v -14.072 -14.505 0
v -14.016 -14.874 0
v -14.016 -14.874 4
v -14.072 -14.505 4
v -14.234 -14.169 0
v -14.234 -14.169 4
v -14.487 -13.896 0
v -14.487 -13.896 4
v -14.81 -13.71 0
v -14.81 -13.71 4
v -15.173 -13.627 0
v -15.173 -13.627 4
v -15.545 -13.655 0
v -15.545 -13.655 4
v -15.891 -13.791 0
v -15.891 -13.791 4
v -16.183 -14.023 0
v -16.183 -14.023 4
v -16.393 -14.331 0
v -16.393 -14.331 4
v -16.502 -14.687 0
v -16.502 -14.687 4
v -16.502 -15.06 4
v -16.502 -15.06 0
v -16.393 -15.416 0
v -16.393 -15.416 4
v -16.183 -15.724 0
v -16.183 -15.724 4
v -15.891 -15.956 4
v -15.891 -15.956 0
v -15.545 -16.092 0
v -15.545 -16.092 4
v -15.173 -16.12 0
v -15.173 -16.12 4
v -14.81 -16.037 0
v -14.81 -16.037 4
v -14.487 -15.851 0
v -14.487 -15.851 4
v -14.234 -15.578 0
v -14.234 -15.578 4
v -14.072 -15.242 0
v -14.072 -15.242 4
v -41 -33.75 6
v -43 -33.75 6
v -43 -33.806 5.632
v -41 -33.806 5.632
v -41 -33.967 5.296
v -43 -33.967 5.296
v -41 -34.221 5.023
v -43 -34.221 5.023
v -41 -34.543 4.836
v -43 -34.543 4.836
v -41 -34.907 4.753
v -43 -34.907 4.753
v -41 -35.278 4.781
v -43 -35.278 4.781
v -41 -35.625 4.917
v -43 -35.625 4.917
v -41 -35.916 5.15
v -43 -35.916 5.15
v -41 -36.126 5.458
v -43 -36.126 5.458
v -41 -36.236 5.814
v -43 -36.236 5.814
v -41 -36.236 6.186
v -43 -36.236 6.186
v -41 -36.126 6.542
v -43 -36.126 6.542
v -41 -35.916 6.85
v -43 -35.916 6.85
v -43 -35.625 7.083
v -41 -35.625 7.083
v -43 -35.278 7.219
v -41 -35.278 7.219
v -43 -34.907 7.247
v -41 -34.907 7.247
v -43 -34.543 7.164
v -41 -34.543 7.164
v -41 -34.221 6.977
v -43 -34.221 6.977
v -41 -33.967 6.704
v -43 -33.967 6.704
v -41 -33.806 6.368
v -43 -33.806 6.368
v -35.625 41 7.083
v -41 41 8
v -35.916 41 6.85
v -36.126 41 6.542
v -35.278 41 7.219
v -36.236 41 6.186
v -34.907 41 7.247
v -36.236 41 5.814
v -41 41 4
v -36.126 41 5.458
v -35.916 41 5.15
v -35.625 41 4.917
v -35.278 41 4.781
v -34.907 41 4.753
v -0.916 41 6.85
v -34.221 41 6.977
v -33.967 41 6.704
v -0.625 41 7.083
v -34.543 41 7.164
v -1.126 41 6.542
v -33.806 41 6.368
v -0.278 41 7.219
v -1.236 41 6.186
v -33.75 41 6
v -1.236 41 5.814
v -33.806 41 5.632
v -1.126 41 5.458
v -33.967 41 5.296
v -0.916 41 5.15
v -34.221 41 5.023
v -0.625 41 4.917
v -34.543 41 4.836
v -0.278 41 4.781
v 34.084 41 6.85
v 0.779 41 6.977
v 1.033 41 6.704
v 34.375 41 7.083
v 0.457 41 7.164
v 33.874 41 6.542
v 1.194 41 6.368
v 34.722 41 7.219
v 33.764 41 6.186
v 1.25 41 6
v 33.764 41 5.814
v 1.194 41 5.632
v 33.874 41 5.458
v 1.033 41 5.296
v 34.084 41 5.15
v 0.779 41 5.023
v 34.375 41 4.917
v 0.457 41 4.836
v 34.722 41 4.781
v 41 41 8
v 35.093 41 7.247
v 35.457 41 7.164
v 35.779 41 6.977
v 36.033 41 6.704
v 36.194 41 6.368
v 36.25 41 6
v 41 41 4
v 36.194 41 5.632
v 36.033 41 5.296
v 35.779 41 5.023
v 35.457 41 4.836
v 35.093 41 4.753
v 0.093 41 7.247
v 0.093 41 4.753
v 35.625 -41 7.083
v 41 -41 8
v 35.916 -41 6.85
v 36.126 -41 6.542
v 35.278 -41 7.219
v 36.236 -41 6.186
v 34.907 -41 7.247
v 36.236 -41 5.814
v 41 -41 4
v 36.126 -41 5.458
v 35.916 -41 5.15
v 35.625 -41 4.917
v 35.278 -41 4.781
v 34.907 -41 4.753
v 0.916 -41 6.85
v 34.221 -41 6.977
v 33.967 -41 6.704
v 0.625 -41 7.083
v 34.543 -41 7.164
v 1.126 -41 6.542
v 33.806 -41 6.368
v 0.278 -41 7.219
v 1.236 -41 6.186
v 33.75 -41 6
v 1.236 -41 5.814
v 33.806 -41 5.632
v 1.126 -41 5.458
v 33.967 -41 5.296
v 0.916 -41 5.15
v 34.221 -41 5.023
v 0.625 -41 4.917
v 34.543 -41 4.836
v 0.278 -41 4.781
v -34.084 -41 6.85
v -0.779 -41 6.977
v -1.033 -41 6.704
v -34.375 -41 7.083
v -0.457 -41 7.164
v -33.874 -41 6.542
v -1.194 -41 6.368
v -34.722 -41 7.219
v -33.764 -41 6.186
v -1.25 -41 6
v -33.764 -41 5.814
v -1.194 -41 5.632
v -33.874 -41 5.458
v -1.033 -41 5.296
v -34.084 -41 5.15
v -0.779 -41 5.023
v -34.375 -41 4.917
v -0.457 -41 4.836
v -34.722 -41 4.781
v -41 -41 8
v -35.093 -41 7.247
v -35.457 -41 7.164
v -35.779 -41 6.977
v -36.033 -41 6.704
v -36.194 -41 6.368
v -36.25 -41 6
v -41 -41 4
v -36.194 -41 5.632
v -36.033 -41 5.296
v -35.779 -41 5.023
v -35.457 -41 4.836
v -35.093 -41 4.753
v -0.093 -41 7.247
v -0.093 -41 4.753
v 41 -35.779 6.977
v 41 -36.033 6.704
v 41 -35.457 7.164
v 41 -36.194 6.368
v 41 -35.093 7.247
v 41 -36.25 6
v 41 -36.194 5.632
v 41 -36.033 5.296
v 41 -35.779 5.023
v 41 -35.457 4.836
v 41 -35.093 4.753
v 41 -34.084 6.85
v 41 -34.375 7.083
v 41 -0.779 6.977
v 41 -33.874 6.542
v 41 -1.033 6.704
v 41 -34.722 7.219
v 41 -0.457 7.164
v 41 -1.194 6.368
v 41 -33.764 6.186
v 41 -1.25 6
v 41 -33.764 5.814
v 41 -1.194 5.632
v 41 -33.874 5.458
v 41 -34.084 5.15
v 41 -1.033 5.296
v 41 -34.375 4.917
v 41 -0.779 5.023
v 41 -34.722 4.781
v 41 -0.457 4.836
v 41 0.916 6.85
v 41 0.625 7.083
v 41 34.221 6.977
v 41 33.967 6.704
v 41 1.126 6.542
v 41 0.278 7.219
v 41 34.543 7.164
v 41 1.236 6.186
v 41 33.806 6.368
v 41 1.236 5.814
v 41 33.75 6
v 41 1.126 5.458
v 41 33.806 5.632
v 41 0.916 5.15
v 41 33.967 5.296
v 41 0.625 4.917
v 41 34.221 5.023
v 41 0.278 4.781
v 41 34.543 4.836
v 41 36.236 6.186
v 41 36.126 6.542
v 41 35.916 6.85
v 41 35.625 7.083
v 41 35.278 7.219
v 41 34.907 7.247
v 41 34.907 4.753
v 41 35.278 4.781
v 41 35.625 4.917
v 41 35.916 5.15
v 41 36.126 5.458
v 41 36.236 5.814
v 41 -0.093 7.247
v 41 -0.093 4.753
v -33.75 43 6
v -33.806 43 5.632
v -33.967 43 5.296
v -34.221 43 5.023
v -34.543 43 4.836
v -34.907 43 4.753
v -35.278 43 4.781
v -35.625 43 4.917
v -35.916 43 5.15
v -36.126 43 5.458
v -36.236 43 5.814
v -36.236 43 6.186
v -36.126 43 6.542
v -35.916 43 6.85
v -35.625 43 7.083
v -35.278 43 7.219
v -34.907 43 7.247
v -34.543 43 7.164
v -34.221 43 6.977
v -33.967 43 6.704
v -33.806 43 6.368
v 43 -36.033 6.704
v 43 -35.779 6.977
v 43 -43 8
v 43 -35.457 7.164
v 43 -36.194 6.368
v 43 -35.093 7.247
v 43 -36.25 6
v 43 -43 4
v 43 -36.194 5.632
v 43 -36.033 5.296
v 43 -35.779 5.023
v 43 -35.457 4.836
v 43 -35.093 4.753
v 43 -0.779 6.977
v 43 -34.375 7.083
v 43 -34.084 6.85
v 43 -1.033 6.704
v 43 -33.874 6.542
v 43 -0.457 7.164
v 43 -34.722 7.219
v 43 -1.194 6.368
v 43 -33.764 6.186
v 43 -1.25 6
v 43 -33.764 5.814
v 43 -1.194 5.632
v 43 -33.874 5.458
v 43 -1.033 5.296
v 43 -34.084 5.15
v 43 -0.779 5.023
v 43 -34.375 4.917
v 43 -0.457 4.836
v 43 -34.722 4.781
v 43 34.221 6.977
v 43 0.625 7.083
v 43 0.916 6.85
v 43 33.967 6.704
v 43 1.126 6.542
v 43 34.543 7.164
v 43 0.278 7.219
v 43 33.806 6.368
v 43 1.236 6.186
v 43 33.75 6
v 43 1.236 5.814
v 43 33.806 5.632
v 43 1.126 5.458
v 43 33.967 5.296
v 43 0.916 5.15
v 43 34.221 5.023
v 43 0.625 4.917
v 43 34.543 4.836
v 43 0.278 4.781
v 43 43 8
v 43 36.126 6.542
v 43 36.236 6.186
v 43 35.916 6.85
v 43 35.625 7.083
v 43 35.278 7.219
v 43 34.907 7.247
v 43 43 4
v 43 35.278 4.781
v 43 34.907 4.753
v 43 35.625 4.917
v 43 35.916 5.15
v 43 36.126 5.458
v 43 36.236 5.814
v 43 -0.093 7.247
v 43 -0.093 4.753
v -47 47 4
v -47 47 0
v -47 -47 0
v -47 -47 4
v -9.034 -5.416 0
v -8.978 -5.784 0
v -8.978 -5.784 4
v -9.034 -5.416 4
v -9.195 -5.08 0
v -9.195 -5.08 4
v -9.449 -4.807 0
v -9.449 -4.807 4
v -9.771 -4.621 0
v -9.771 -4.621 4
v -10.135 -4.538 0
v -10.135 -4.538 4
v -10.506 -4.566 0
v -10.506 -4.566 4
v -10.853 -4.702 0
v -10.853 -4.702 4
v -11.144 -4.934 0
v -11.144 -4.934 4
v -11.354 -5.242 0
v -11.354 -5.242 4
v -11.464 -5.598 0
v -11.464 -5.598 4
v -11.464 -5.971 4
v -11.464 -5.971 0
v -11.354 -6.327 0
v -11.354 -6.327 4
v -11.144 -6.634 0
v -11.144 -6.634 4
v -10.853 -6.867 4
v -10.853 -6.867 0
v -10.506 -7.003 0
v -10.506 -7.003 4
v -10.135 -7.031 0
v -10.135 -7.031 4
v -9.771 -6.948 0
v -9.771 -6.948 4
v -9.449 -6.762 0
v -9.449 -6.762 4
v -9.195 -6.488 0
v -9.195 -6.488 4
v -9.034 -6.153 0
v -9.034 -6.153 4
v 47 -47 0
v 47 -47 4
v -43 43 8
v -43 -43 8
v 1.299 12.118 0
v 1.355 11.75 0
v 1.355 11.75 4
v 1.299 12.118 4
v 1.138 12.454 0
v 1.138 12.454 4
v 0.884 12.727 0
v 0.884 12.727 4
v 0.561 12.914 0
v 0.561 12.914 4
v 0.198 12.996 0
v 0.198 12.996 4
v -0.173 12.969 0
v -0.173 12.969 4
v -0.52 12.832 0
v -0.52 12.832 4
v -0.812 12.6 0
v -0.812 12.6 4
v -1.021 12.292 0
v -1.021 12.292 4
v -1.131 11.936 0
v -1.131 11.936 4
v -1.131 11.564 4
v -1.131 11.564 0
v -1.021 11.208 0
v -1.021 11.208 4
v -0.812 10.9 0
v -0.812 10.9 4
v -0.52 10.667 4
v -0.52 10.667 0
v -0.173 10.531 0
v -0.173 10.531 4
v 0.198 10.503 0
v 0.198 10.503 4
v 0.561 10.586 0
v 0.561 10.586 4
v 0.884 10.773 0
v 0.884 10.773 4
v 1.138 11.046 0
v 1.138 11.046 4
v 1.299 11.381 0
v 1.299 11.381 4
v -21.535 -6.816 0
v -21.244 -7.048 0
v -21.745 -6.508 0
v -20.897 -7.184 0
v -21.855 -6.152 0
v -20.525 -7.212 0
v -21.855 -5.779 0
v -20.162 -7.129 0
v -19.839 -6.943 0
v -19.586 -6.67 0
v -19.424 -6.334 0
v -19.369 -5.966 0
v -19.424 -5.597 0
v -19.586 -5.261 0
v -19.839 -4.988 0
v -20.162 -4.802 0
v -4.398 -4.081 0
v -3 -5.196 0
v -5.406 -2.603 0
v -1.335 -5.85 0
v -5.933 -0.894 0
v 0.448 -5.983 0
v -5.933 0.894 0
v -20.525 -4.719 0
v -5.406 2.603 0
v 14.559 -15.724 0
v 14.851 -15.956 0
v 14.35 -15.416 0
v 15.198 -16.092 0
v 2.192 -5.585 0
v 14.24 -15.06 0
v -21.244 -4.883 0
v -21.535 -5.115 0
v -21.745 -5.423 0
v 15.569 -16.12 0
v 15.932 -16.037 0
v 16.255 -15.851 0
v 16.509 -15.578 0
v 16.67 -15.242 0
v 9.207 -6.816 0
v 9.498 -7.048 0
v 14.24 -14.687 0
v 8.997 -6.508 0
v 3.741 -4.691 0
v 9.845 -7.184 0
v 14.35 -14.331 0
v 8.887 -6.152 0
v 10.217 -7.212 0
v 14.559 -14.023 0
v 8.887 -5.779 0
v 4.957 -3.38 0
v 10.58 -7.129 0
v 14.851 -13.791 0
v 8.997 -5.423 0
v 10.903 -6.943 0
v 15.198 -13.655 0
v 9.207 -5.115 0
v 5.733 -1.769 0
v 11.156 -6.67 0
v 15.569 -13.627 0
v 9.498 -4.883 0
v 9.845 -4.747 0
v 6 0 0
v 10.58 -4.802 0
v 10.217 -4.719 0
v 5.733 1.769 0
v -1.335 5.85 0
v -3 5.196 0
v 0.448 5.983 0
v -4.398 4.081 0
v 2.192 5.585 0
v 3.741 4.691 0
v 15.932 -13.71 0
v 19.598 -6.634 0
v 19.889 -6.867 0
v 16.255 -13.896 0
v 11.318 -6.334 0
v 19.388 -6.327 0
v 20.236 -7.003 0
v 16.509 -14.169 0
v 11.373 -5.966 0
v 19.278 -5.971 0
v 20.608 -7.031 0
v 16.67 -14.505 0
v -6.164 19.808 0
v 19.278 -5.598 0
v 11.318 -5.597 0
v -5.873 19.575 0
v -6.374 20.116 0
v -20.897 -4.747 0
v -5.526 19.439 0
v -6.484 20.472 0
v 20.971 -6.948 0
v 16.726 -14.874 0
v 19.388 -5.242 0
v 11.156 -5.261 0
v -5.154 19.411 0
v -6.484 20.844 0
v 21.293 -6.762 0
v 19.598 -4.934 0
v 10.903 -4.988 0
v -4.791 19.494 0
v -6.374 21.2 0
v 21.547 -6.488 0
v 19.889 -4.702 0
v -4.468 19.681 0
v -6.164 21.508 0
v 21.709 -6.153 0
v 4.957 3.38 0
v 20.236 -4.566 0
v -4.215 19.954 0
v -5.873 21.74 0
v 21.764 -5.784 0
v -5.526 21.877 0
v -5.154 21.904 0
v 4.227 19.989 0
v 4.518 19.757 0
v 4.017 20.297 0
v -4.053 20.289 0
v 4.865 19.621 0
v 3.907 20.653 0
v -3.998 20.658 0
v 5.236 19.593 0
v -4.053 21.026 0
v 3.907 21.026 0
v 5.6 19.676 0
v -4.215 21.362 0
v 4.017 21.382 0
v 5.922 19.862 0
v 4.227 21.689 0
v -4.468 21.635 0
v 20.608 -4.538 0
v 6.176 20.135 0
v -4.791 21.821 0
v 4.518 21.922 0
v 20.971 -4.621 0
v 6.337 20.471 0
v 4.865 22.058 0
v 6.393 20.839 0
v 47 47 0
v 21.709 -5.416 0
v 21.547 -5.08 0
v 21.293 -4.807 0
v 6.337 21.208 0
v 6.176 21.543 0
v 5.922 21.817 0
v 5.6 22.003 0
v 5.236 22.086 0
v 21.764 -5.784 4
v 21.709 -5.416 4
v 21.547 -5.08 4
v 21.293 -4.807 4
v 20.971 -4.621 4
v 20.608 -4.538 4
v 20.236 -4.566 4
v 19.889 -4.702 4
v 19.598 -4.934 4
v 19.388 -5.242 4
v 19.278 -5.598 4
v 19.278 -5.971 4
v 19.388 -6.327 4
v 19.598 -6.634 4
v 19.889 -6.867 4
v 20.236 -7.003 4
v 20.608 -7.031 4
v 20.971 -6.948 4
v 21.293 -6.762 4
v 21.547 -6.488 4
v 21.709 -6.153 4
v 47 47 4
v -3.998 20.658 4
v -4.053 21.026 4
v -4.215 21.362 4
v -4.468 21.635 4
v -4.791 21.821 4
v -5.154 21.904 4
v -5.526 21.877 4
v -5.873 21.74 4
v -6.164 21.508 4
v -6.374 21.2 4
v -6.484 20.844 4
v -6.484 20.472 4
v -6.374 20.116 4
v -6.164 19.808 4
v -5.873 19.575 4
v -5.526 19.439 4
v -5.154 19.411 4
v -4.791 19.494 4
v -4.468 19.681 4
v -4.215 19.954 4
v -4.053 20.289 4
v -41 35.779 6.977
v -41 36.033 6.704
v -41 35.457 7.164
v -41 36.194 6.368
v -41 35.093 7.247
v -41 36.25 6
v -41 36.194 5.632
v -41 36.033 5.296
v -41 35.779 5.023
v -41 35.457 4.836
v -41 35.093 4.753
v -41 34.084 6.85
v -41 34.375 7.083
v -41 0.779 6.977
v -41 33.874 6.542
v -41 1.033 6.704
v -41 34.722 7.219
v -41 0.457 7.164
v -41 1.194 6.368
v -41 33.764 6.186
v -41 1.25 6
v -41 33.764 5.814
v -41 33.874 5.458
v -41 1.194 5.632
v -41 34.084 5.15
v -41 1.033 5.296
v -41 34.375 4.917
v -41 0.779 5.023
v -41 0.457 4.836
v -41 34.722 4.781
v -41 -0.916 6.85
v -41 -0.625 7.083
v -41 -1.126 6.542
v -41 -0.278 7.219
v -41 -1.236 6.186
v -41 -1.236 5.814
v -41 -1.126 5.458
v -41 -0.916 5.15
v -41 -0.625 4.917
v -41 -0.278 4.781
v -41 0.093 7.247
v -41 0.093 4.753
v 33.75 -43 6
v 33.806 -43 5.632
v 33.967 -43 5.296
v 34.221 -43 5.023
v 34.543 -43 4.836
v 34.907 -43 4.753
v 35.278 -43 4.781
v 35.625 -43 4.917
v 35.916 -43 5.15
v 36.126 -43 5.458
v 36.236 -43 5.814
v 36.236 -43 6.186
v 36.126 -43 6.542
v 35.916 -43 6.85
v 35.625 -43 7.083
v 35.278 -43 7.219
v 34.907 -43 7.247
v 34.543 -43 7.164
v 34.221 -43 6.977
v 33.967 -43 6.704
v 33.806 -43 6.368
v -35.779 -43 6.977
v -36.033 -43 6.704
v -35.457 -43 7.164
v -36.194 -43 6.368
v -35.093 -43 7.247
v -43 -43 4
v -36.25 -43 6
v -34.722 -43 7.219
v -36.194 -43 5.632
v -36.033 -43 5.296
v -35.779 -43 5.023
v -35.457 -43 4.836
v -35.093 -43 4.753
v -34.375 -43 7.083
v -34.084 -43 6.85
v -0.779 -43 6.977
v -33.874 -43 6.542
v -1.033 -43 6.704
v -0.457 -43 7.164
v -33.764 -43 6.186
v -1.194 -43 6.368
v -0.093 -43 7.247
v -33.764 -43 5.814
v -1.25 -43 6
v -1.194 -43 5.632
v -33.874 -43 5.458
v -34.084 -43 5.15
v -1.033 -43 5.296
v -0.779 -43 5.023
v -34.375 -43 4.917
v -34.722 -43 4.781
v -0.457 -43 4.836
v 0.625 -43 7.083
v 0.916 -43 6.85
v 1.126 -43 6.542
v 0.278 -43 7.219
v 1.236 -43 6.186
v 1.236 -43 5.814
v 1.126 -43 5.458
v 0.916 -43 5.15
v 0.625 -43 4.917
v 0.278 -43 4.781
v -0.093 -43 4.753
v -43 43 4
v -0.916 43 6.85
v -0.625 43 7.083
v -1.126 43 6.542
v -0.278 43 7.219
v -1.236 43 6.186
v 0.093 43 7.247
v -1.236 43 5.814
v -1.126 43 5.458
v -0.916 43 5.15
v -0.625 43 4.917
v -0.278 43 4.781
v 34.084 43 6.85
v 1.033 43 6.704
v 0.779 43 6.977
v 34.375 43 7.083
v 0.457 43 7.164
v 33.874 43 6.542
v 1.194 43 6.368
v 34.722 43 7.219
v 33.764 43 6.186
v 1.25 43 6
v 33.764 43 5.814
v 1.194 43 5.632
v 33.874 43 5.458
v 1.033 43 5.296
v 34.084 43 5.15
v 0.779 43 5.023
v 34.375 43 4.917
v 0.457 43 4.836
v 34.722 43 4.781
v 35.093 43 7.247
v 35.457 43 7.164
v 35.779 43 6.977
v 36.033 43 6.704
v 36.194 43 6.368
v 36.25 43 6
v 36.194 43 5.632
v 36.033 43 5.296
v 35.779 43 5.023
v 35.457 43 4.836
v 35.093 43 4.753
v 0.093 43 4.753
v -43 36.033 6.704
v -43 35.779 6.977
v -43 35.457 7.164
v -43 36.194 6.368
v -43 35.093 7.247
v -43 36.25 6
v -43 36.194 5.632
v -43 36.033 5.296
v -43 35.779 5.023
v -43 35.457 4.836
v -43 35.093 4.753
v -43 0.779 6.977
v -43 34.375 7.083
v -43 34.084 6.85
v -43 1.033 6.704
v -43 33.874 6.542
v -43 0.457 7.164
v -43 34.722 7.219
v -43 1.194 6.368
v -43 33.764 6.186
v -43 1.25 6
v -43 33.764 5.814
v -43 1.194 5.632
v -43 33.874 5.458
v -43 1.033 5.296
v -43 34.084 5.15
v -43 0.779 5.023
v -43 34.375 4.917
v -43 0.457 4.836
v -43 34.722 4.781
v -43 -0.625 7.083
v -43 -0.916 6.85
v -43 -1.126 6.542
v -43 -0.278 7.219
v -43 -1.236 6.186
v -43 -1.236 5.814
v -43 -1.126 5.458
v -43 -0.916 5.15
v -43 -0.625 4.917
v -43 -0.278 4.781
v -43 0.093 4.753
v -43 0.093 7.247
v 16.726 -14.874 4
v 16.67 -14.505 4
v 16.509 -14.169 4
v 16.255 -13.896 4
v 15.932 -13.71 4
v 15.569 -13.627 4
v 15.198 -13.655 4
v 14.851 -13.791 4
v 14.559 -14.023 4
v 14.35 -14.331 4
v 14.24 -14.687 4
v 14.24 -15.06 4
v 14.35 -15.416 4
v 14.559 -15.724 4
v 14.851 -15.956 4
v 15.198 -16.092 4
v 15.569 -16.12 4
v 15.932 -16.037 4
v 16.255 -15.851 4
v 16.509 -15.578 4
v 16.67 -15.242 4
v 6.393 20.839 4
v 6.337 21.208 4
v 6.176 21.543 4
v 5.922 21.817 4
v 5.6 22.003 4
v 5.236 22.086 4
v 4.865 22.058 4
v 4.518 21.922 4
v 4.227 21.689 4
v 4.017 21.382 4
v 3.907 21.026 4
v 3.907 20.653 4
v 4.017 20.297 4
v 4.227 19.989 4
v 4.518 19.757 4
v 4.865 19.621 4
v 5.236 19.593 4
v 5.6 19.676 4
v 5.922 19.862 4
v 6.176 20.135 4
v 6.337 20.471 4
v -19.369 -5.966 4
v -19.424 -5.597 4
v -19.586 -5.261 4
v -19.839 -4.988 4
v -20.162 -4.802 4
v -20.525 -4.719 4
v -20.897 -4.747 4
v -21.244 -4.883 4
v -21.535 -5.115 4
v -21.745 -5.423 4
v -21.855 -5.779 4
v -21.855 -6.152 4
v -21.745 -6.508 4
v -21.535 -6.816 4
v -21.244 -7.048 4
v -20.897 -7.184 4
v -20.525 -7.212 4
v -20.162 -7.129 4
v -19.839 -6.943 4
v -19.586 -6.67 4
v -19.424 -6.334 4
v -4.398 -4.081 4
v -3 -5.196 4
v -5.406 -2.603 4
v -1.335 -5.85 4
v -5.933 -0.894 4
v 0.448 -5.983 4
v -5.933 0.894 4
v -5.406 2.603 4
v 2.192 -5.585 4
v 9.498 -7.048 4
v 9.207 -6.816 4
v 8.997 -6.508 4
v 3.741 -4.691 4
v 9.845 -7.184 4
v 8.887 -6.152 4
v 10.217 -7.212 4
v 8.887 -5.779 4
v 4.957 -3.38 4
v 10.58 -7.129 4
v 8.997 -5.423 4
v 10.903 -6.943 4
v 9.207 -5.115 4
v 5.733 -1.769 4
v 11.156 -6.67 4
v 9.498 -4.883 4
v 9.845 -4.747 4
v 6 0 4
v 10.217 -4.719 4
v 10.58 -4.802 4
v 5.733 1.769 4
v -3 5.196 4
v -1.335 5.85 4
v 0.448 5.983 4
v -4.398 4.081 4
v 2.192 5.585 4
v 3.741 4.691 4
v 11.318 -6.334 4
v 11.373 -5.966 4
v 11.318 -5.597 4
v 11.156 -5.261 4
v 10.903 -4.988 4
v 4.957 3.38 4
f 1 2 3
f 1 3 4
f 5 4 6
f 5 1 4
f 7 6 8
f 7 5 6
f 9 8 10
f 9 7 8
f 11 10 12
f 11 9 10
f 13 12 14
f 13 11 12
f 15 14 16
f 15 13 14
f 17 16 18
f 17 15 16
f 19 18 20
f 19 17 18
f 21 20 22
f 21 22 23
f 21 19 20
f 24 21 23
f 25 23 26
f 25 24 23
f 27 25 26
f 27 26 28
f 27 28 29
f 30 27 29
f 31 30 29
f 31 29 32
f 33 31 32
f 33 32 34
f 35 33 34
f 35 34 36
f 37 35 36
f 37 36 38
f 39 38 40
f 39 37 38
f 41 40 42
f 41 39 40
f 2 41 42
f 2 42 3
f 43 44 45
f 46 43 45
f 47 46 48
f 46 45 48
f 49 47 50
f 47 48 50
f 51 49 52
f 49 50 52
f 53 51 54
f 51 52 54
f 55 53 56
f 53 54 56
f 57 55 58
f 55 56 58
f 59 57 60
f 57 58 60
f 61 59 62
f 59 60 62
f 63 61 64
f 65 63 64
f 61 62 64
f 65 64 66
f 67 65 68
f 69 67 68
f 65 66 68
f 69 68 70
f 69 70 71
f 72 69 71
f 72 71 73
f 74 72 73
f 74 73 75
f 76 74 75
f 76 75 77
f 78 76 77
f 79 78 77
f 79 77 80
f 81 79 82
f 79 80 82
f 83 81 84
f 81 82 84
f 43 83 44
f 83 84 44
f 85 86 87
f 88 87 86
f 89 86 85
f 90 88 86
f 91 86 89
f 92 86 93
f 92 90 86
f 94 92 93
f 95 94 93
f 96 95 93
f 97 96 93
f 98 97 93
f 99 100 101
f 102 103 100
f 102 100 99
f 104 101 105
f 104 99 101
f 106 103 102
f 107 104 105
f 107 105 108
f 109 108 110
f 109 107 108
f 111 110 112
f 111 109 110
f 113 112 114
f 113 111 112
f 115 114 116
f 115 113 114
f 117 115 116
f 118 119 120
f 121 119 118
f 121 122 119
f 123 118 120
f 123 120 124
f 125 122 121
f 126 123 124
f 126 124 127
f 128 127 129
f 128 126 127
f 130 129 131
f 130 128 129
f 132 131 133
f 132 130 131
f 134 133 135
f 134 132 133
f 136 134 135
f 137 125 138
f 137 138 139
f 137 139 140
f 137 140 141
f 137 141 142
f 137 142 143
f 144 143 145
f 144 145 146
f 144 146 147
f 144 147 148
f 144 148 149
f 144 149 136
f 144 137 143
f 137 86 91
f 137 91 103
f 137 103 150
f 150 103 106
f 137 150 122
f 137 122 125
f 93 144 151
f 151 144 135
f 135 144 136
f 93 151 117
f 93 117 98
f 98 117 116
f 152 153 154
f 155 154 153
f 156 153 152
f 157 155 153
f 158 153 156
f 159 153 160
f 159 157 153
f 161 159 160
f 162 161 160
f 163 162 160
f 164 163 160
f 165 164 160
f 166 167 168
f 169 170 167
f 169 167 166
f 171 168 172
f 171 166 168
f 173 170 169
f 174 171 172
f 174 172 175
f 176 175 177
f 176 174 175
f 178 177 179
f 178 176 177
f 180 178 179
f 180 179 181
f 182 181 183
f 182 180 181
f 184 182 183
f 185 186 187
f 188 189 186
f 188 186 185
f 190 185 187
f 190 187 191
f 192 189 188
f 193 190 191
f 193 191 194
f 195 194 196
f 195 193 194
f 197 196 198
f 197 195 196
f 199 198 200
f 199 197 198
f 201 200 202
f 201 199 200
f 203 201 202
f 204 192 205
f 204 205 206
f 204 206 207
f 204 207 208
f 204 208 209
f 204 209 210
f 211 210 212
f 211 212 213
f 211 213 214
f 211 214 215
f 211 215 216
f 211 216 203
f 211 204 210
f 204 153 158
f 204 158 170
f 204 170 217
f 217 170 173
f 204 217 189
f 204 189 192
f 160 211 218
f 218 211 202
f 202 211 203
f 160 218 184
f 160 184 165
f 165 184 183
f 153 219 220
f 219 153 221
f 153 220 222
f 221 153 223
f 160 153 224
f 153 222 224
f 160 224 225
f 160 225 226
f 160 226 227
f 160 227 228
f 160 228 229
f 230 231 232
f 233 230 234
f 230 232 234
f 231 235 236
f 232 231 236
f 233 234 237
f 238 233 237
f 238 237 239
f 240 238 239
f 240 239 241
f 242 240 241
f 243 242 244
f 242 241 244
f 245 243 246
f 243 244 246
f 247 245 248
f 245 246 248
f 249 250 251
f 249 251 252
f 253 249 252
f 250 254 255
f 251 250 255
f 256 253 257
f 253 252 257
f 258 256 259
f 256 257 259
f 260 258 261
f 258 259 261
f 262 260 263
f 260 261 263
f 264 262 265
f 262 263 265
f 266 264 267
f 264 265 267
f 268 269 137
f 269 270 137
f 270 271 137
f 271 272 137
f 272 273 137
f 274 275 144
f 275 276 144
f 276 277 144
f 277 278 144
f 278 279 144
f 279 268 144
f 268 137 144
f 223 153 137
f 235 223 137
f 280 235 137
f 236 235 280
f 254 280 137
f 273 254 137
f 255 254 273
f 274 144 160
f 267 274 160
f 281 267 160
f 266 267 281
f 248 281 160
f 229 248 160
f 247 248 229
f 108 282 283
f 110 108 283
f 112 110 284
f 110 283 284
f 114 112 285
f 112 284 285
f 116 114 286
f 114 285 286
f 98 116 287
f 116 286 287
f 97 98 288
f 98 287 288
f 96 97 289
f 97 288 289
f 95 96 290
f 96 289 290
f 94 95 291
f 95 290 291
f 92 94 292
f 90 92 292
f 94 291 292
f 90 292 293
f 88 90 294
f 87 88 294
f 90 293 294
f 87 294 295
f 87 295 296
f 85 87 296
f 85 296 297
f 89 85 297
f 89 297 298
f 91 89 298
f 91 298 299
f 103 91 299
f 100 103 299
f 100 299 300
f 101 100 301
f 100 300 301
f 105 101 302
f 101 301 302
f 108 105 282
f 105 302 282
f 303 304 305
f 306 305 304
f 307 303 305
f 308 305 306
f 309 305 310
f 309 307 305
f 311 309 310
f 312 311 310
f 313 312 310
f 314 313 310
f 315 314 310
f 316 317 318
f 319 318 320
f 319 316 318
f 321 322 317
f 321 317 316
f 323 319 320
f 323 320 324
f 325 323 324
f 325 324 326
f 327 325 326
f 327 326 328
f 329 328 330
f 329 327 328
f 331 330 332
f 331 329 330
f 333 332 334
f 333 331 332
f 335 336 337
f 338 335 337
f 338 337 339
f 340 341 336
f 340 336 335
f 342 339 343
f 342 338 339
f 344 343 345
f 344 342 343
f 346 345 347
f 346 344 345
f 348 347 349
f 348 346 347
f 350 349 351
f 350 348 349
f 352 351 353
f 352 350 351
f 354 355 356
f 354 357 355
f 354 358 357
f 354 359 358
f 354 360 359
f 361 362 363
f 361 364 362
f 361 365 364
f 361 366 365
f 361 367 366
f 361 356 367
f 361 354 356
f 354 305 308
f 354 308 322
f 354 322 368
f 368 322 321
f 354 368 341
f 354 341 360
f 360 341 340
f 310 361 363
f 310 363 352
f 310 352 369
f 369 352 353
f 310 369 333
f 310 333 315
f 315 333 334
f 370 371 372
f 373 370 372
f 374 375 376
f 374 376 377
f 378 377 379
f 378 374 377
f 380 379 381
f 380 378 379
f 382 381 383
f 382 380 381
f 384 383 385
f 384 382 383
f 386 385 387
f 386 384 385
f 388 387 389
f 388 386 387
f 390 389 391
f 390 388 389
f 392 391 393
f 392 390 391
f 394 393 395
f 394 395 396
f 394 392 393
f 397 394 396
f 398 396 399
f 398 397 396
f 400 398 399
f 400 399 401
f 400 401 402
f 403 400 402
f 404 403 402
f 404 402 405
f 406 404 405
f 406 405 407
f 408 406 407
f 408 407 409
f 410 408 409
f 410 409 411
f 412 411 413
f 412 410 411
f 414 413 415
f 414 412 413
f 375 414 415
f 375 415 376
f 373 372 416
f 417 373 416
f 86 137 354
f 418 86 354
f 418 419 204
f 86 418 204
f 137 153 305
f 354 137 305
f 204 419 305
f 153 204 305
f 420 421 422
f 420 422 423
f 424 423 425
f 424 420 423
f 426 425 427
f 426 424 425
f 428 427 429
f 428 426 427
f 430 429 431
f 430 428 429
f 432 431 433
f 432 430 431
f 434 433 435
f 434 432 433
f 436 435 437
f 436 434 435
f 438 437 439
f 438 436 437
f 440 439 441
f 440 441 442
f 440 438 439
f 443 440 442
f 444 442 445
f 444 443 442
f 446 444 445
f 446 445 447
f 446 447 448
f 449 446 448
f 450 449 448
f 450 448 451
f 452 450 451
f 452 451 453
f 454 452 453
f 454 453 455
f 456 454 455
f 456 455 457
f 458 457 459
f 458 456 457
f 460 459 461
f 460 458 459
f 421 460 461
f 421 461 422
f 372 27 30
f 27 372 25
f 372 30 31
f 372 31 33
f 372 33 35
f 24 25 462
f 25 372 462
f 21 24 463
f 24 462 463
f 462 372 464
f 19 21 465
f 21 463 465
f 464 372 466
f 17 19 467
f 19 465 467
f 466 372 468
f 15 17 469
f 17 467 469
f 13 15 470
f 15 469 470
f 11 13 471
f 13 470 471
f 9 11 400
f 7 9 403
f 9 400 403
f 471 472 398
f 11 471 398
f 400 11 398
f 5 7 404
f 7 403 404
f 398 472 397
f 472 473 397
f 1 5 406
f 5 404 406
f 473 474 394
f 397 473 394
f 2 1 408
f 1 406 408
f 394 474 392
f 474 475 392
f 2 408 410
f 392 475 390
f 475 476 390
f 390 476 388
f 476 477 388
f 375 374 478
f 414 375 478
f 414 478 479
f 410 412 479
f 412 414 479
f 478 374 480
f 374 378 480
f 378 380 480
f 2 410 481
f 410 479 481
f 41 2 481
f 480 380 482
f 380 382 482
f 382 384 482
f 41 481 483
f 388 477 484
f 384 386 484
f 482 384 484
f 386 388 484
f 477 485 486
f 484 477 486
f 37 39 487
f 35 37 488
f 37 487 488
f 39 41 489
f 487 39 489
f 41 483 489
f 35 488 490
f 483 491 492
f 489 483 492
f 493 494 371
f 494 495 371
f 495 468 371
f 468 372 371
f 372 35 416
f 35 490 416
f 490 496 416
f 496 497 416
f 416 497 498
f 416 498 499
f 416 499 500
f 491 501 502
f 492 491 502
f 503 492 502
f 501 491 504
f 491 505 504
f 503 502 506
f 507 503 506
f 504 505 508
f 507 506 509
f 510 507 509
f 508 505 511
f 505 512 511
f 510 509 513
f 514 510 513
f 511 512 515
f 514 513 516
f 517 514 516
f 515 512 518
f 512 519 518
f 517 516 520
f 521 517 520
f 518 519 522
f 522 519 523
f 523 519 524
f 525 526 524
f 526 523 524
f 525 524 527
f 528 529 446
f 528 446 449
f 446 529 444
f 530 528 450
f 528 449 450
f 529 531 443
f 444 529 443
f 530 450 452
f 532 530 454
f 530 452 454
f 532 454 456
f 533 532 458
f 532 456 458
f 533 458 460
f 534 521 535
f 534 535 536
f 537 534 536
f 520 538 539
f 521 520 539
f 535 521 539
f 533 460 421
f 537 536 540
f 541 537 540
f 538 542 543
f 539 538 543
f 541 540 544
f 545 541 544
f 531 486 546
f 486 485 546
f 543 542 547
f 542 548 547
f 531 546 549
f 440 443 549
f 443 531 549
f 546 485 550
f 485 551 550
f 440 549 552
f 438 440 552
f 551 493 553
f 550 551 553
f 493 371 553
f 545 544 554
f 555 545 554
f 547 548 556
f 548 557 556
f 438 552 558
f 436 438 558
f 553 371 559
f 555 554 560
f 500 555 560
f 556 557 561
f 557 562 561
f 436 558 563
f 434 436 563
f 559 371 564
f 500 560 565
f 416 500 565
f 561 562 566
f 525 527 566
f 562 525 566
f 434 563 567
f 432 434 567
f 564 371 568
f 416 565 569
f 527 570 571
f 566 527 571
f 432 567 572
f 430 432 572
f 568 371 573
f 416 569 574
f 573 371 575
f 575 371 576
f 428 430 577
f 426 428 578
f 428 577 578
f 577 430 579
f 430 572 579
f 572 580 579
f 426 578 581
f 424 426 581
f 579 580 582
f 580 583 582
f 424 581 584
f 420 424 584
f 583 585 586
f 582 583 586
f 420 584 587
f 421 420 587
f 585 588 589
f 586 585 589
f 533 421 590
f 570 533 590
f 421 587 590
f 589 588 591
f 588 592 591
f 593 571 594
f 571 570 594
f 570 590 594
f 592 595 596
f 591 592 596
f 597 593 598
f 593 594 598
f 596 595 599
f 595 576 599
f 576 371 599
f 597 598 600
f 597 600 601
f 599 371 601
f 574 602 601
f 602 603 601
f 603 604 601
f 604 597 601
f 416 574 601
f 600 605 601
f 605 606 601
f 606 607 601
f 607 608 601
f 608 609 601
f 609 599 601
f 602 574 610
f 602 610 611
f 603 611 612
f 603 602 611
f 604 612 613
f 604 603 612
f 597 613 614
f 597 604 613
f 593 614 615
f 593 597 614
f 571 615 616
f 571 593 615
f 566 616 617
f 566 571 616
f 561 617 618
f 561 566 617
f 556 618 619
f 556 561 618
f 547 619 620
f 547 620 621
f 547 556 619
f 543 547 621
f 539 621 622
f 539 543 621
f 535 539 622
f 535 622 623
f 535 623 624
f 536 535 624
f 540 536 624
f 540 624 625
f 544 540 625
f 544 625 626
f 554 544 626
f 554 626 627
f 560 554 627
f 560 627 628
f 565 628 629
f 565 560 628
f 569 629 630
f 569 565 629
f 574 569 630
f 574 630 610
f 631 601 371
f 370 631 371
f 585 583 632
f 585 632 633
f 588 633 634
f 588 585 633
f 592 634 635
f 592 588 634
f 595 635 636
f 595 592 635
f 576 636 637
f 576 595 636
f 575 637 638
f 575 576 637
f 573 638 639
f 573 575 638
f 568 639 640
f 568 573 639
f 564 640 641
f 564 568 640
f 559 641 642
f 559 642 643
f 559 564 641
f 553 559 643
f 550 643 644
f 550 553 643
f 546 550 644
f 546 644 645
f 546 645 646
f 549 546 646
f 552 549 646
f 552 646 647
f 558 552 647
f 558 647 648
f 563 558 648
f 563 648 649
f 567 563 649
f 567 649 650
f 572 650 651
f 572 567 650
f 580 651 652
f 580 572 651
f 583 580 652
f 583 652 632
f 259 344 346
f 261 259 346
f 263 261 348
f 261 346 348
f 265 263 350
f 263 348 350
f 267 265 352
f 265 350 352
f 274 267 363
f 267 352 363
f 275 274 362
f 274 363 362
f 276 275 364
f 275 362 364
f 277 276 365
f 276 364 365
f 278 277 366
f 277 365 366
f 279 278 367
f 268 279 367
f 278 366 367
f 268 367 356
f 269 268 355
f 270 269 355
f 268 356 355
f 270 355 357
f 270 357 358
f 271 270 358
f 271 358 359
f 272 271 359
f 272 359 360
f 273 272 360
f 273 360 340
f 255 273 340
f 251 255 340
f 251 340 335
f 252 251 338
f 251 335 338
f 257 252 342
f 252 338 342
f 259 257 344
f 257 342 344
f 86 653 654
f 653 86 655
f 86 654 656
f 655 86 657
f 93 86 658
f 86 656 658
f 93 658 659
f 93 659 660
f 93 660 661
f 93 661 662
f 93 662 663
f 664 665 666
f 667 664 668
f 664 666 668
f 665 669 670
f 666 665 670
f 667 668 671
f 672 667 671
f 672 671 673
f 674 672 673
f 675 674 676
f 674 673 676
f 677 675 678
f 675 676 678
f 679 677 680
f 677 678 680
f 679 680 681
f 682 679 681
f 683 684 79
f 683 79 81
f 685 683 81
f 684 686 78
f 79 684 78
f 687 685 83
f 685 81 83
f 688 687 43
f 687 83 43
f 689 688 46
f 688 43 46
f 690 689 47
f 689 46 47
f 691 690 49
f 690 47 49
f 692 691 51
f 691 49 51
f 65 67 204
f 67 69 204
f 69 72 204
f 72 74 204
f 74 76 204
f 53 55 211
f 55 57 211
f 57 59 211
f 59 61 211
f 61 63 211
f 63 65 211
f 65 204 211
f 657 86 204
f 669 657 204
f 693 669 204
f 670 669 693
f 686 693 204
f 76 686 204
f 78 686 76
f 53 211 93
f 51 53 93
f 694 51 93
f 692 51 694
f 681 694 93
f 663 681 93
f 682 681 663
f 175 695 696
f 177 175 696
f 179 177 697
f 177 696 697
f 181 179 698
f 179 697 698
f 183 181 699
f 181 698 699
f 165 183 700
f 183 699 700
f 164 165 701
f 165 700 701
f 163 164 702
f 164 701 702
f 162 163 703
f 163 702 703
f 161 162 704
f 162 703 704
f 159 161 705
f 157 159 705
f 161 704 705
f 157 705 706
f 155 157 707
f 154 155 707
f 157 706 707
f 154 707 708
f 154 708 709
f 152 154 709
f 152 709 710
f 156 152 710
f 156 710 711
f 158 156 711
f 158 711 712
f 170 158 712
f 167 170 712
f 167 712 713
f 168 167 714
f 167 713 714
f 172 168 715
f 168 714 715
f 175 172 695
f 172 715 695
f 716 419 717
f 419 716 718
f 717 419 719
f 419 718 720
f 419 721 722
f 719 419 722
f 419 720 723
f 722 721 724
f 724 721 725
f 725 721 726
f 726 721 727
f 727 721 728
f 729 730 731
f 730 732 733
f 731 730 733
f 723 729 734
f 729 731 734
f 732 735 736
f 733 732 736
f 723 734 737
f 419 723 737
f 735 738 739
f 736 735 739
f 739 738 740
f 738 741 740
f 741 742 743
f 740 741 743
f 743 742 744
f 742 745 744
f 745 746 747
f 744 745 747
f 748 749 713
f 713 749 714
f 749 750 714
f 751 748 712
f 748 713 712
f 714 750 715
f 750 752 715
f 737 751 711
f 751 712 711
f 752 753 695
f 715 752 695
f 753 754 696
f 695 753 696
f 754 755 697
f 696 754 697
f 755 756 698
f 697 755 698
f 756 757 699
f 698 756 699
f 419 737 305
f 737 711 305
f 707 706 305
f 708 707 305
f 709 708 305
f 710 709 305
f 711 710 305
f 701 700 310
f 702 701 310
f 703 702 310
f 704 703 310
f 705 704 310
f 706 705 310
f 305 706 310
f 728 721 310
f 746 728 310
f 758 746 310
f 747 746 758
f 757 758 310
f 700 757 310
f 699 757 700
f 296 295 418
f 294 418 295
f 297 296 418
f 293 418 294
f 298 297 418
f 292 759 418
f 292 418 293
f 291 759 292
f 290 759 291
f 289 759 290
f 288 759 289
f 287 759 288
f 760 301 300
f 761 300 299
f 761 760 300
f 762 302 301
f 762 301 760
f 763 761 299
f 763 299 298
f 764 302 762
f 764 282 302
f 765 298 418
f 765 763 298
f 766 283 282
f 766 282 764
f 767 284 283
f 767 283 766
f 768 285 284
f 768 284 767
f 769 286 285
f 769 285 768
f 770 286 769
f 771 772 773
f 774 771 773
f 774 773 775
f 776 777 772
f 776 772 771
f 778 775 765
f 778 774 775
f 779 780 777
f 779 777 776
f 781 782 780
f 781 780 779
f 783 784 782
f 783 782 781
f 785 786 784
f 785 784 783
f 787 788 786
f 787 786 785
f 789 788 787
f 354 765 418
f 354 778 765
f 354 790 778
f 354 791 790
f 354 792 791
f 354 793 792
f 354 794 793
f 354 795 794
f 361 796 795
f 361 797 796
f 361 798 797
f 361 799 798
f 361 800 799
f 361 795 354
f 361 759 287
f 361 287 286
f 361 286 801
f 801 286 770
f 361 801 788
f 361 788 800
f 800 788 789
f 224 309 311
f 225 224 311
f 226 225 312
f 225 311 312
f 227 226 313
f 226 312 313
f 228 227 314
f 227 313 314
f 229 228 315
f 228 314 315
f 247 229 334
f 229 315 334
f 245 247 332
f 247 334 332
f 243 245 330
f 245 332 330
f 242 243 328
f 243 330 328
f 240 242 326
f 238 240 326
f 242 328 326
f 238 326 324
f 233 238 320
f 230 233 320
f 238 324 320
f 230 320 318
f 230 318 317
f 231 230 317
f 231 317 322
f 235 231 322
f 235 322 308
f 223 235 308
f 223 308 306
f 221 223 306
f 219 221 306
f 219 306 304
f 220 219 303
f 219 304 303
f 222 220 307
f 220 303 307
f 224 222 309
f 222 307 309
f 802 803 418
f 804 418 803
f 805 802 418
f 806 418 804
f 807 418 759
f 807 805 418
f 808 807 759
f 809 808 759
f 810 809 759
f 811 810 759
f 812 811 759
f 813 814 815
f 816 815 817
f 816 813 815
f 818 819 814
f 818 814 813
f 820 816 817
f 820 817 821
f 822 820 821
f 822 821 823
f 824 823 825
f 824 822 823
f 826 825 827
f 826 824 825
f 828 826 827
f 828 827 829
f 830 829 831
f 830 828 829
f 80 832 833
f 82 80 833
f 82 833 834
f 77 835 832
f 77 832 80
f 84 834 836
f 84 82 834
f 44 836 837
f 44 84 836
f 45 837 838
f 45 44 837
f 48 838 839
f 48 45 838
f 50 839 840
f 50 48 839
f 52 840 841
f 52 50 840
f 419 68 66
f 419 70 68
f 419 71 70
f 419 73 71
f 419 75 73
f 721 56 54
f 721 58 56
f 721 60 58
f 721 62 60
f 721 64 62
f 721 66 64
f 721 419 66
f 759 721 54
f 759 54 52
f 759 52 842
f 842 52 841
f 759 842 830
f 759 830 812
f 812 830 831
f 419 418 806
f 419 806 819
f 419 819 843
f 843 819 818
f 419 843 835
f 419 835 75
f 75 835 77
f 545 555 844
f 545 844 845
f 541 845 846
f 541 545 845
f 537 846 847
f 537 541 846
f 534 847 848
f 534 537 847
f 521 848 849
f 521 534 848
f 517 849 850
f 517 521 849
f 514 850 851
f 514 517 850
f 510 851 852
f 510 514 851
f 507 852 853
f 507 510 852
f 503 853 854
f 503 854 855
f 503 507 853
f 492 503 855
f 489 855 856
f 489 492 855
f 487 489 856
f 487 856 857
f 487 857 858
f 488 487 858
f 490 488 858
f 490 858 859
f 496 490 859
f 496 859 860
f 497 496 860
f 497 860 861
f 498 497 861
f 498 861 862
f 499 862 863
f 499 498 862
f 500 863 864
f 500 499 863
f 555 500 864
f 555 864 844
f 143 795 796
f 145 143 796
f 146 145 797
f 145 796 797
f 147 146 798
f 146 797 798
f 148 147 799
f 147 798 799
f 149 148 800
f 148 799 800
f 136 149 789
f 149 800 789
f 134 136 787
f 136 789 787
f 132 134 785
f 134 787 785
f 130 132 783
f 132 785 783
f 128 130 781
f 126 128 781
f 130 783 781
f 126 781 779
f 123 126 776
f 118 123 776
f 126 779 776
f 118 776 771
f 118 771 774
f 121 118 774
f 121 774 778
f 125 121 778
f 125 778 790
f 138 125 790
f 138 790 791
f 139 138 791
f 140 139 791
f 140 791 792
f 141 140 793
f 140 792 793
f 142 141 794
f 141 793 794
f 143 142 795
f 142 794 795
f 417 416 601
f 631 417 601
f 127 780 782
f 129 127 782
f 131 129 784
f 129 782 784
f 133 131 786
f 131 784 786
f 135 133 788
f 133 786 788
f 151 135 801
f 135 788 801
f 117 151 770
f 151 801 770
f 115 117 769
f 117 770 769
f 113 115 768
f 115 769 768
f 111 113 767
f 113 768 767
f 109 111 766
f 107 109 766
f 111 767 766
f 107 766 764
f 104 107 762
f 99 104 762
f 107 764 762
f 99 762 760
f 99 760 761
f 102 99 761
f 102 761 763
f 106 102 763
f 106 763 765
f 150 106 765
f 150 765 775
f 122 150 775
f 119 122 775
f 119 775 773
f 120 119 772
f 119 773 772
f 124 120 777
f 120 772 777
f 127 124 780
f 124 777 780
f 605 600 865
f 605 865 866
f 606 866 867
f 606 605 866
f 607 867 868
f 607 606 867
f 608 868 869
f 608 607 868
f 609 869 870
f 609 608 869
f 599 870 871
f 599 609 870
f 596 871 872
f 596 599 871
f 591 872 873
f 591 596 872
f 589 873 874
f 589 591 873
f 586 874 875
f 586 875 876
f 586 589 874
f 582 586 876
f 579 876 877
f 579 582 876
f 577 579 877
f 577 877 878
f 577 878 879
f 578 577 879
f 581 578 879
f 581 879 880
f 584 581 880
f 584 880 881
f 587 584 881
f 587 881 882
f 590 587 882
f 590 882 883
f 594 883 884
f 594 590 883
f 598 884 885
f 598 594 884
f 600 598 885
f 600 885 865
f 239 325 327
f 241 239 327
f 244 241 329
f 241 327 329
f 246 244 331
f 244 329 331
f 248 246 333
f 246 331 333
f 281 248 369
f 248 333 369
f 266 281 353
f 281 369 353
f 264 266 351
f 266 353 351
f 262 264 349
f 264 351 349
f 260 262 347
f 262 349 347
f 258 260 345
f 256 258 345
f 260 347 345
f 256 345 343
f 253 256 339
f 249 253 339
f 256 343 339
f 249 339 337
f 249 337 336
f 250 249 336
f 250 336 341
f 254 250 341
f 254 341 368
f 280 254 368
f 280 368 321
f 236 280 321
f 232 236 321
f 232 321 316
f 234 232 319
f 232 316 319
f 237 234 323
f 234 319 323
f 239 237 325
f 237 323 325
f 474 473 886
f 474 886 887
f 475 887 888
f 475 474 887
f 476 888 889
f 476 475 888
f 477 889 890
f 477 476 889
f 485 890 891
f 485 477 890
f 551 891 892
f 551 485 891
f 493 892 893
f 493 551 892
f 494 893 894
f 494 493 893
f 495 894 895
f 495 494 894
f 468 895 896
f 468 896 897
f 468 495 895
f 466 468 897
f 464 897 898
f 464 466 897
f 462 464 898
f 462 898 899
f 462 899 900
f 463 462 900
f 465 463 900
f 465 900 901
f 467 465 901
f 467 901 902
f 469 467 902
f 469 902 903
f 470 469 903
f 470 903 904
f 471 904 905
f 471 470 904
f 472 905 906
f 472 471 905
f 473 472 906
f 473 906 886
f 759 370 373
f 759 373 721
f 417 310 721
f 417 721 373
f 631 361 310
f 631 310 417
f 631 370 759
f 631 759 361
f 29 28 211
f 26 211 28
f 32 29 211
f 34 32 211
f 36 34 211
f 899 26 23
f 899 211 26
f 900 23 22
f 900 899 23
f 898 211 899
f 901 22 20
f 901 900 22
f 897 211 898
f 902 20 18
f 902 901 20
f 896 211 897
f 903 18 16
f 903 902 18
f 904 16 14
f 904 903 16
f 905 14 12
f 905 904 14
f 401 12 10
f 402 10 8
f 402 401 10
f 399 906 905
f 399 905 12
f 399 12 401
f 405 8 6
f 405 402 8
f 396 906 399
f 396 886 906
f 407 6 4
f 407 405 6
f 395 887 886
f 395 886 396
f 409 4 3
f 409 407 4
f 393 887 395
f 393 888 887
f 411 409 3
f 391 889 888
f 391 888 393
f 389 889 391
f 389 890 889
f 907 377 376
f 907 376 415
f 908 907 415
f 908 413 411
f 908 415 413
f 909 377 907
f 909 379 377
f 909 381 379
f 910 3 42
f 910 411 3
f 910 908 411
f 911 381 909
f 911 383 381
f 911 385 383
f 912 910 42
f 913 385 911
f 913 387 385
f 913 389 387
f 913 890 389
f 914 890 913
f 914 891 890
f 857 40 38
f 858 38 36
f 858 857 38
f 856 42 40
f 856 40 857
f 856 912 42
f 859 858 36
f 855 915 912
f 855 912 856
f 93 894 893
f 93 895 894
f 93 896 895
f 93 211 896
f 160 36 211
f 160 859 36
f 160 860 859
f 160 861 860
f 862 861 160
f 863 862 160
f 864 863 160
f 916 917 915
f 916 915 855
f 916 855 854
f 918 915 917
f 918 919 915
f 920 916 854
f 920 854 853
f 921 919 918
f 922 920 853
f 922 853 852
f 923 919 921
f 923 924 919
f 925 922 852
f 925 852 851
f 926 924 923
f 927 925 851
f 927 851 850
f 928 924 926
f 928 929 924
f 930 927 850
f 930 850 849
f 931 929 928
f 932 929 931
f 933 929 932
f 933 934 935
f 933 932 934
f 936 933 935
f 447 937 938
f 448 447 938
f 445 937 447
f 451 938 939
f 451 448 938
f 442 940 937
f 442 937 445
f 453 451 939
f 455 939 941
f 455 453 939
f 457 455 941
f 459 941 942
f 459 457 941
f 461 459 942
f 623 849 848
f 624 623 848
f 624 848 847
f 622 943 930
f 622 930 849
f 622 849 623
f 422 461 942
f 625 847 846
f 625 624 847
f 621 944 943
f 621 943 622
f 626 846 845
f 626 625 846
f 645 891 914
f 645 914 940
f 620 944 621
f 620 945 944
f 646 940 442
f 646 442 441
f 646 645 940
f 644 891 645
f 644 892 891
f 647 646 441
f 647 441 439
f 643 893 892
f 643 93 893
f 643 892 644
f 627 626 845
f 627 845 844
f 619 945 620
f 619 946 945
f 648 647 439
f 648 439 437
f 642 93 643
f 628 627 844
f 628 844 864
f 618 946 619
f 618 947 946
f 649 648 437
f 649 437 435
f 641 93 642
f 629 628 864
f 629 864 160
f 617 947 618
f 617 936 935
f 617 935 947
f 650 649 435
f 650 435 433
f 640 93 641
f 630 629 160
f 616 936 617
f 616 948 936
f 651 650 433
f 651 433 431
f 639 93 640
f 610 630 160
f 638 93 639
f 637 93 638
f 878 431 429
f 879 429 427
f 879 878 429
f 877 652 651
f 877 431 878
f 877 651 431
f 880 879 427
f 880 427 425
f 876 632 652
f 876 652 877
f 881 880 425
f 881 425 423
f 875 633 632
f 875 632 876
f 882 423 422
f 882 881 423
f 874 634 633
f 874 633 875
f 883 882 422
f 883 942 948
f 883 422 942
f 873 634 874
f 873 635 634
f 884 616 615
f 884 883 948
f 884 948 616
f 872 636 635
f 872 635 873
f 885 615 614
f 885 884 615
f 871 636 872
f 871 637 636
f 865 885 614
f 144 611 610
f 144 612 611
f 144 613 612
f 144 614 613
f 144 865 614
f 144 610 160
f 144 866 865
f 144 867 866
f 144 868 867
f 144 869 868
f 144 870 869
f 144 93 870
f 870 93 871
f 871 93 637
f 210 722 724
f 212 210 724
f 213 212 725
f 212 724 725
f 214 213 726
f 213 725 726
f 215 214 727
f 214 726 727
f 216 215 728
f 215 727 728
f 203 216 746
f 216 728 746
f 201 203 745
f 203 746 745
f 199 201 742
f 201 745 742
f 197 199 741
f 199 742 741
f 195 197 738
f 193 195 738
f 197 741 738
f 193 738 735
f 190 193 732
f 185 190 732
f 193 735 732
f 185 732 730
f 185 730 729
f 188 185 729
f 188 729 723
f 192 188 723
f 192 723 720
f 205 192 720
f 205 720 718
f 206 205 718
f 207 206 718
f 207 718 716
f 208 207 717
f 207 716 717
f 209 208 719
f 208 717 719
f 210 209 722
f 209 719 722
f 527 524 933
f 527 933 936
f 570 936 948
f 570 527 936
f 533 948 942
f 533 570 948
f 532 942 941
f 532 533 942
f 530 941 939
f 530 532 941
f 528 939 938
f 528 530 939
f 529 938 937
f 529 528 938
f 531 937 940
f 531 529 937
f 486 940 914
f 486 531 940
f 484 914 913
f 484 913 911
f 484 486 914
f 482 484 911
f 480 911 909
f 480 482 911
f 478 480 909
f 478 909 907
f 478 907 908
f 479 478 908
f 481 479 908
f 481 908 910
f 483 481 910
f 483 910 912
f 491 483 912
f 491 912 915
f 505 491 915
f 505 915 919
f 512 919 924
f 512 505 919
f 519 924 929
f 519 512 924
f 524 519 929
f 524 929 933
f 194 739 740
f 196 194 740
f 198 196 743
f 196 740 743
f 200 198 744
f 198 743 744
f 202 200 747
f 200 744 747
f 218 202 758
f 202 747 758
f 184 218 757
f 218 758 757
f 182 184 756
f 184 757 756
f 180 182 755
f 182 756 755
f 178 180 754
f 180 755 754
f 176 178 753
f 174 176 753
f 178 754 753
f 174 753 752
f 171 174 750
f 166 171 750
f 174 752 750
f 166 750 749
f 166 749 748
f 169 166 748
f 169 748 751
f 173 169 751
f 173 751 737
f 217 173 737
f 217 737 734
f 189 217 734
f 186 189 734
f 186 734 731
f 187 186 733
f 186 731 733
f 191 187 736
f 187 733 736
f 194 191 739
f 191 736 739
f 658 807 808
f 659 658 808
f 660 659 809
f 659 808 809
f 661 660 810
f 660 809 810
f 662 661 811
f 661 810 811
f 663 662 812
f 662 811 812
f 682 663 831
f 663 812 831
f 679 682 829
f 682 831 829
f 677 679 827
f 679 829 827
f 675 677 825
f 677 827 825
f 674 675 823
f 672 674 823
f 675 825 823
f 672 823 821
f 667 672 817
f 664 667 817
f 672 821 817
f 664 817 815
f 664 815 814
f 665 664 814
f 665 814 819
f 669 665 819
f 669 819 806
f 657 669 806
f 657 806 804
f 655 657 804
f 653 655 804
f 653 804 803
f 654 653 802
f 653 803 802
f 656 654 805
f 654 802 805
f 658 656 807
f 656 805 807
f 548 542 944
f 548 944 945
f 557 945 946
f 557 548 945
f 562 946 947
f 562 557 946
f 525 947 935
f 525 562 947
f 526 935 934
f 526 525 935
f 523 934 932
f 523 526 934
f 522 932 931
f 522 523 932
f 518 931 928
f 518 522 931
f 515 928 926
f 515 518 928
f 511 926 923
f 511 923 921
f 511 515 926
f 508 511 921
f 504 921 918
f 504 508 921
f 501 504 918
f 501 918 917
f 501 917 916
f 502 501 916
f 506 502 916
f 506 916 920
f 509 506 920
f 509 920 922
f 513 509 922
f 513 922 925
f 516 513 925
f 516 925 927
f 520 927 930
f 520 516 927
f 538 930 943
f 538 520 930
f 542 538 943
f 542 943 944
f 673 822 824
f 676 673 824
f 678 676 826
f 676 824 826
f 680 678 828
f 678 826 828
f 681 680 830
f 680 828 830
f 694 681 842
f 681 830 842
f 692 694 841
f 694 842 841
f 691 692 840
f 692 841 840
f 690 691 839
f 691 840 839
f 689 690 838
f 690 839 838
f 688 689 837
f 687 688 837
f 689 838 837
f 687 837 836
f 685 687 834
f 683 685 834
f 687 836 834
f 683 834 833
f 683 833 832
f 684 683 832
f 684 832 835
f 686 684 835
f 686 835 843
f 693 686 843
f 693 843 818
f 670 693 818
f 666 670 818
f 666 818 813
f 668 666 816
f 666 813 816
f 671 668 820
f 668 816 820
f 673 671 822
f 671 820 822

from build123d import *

# Parameters (mm, degrees)
SKETCH_1_R               = 1.25
SKETCH_1_R_2             = 6
EXTRUDE_1_DEPTH          = 4
SKETCH_3_W               = 2
SKETCH_3_H               = 4
EXTRUDE_2_DEPTH          = 43
SKETCH_4_W               = 4
SKETCH_4_H               = 2
EXTRUDE_3_DEPTH          = 43
SKETCH_5_R               = 1.25
CUT_EXTRUDE_1_DEPTH      = 2
PATTERN_CIRCULAR_1_COUNT = 4


with BuildPart() as part:
    # 草图1 → 凸台-拉伸1 (new body)
    with BuildSketch(Plane.XY):
        Polygon((47, 47), (0, 47), (-47, 47), (-47, 0), (-47, -47), (0, -47), (47, -47), (47, 0), align=None)
        with Locations((-15.266370453, -14.873586171)):
            Circle(SKETCH_1_R, mode=Mode.SUBTRACT)
        with Locations((-20.618803135, -5.965642279)):
            Circle(SKETCH_1_R, mode=Mode.SUBTRACT)
        with Locations((-10.228081088, -5.784271551)):
            Circle(SKETCH_1_R, mode=Mode.SUBTRACT)
        with Locations((15.47579933, -14.873586171)):
            Circle(SKETCH_1_R, mode=Mode.SUBTRACT)
        with Locations((10.123366649, -5.965642279)):
            Circle(SKETCH_1_R, mode=Mode.SUBTRACT)
        with Locations((20.514088696, -5.784271551)):
            Circle(SKETCH_1_R, mode=Mode.SUBTRACT)
        with Locations((-5.247718243, 20.657857721)):
            Circle(SKETCH_1_R, mode=Mode.SUBTRACT)
        Circle(SKETCH_1_R_2, mode=Mode.SUBTRACT)
        with Locations((0.104714439, 11.749913829)):
            Circle(SKETCH_1_R, mode=Mode.SUBTRACT)
        with Locations((5.143003804, 20.839228449)):
            Circle(SKETCH_1_R, mode=Mode.SUBTRACT)
    extrude(amount=EXTRUDE_1_DEPTH)

    # 草图3 → 凸台-拉伸2 (add, symmetric)
    with BuildSketch(Plane(origin=(0, 0, 0), x_dir=(1, 0, 0), z_dir=(0, 1, 0))):
        with Locations((-42, -6)):
            Rectangle(SKETCH_3_W, SKETCH_3_H)
        with Locations((42, -6)):
            Rectangle(SKETCH_3_W, SKETCH_3_H)
    extrude(amount=EXTRUDE_2_DEPTH, both=True)

    # 草图4 → 凸台-拉伸3 (add, symmetric)
    with BuildSketch(Plane(origin=(0, 0, 0), x_dir=(0, 0, -1), z_dir=(1, 0, 0))):
        with Locations((-6, -42)):
            Rectangle(SKETCH_4_W, SKETCH_4_H)
        with Locations((-6, 42)):
            Rectangle(SKETCH_4_W, SKETCH_4_H)
    extrude(amount=EXTRUDE_3_DEPTH, both=True)

    # 草图5 → 切除-拉伸1 (cut)
    with BuildSketch(Plane(origin=(0, 43, 0), x_dir=(1, 0, 0), z_dir=(0, 1, 0))):
        with Locations((0, -6)):
            Circle(SKETCH_5_R)
        with Locations((35, -6)):
            Circle(SKETCH_5_R)
        with Locations((-35, -6)):
            Circle(SKETCH_5_R)
    cut_extrude_1 = extrude(amount=-CUT_EXTRUDE_1_DEPTH, mode=Mode.SUBTRACT)

    # 阵列(圆周)1: 切除-拉伸1 ×4 about axis
    pattern_circular_1_axis = Axis((0, 0, 4), (0, 0, 1))
    for i in range(1, PATTERN_CIRCULAR_1_COUNT):
        add(cut_extrude_1.rotate(pattern_circular_1_axis, i * 360 / PATTERN_CIRCULAR_1_COUNT), mode=Mode.SUBTRACT)


solid = part.part
